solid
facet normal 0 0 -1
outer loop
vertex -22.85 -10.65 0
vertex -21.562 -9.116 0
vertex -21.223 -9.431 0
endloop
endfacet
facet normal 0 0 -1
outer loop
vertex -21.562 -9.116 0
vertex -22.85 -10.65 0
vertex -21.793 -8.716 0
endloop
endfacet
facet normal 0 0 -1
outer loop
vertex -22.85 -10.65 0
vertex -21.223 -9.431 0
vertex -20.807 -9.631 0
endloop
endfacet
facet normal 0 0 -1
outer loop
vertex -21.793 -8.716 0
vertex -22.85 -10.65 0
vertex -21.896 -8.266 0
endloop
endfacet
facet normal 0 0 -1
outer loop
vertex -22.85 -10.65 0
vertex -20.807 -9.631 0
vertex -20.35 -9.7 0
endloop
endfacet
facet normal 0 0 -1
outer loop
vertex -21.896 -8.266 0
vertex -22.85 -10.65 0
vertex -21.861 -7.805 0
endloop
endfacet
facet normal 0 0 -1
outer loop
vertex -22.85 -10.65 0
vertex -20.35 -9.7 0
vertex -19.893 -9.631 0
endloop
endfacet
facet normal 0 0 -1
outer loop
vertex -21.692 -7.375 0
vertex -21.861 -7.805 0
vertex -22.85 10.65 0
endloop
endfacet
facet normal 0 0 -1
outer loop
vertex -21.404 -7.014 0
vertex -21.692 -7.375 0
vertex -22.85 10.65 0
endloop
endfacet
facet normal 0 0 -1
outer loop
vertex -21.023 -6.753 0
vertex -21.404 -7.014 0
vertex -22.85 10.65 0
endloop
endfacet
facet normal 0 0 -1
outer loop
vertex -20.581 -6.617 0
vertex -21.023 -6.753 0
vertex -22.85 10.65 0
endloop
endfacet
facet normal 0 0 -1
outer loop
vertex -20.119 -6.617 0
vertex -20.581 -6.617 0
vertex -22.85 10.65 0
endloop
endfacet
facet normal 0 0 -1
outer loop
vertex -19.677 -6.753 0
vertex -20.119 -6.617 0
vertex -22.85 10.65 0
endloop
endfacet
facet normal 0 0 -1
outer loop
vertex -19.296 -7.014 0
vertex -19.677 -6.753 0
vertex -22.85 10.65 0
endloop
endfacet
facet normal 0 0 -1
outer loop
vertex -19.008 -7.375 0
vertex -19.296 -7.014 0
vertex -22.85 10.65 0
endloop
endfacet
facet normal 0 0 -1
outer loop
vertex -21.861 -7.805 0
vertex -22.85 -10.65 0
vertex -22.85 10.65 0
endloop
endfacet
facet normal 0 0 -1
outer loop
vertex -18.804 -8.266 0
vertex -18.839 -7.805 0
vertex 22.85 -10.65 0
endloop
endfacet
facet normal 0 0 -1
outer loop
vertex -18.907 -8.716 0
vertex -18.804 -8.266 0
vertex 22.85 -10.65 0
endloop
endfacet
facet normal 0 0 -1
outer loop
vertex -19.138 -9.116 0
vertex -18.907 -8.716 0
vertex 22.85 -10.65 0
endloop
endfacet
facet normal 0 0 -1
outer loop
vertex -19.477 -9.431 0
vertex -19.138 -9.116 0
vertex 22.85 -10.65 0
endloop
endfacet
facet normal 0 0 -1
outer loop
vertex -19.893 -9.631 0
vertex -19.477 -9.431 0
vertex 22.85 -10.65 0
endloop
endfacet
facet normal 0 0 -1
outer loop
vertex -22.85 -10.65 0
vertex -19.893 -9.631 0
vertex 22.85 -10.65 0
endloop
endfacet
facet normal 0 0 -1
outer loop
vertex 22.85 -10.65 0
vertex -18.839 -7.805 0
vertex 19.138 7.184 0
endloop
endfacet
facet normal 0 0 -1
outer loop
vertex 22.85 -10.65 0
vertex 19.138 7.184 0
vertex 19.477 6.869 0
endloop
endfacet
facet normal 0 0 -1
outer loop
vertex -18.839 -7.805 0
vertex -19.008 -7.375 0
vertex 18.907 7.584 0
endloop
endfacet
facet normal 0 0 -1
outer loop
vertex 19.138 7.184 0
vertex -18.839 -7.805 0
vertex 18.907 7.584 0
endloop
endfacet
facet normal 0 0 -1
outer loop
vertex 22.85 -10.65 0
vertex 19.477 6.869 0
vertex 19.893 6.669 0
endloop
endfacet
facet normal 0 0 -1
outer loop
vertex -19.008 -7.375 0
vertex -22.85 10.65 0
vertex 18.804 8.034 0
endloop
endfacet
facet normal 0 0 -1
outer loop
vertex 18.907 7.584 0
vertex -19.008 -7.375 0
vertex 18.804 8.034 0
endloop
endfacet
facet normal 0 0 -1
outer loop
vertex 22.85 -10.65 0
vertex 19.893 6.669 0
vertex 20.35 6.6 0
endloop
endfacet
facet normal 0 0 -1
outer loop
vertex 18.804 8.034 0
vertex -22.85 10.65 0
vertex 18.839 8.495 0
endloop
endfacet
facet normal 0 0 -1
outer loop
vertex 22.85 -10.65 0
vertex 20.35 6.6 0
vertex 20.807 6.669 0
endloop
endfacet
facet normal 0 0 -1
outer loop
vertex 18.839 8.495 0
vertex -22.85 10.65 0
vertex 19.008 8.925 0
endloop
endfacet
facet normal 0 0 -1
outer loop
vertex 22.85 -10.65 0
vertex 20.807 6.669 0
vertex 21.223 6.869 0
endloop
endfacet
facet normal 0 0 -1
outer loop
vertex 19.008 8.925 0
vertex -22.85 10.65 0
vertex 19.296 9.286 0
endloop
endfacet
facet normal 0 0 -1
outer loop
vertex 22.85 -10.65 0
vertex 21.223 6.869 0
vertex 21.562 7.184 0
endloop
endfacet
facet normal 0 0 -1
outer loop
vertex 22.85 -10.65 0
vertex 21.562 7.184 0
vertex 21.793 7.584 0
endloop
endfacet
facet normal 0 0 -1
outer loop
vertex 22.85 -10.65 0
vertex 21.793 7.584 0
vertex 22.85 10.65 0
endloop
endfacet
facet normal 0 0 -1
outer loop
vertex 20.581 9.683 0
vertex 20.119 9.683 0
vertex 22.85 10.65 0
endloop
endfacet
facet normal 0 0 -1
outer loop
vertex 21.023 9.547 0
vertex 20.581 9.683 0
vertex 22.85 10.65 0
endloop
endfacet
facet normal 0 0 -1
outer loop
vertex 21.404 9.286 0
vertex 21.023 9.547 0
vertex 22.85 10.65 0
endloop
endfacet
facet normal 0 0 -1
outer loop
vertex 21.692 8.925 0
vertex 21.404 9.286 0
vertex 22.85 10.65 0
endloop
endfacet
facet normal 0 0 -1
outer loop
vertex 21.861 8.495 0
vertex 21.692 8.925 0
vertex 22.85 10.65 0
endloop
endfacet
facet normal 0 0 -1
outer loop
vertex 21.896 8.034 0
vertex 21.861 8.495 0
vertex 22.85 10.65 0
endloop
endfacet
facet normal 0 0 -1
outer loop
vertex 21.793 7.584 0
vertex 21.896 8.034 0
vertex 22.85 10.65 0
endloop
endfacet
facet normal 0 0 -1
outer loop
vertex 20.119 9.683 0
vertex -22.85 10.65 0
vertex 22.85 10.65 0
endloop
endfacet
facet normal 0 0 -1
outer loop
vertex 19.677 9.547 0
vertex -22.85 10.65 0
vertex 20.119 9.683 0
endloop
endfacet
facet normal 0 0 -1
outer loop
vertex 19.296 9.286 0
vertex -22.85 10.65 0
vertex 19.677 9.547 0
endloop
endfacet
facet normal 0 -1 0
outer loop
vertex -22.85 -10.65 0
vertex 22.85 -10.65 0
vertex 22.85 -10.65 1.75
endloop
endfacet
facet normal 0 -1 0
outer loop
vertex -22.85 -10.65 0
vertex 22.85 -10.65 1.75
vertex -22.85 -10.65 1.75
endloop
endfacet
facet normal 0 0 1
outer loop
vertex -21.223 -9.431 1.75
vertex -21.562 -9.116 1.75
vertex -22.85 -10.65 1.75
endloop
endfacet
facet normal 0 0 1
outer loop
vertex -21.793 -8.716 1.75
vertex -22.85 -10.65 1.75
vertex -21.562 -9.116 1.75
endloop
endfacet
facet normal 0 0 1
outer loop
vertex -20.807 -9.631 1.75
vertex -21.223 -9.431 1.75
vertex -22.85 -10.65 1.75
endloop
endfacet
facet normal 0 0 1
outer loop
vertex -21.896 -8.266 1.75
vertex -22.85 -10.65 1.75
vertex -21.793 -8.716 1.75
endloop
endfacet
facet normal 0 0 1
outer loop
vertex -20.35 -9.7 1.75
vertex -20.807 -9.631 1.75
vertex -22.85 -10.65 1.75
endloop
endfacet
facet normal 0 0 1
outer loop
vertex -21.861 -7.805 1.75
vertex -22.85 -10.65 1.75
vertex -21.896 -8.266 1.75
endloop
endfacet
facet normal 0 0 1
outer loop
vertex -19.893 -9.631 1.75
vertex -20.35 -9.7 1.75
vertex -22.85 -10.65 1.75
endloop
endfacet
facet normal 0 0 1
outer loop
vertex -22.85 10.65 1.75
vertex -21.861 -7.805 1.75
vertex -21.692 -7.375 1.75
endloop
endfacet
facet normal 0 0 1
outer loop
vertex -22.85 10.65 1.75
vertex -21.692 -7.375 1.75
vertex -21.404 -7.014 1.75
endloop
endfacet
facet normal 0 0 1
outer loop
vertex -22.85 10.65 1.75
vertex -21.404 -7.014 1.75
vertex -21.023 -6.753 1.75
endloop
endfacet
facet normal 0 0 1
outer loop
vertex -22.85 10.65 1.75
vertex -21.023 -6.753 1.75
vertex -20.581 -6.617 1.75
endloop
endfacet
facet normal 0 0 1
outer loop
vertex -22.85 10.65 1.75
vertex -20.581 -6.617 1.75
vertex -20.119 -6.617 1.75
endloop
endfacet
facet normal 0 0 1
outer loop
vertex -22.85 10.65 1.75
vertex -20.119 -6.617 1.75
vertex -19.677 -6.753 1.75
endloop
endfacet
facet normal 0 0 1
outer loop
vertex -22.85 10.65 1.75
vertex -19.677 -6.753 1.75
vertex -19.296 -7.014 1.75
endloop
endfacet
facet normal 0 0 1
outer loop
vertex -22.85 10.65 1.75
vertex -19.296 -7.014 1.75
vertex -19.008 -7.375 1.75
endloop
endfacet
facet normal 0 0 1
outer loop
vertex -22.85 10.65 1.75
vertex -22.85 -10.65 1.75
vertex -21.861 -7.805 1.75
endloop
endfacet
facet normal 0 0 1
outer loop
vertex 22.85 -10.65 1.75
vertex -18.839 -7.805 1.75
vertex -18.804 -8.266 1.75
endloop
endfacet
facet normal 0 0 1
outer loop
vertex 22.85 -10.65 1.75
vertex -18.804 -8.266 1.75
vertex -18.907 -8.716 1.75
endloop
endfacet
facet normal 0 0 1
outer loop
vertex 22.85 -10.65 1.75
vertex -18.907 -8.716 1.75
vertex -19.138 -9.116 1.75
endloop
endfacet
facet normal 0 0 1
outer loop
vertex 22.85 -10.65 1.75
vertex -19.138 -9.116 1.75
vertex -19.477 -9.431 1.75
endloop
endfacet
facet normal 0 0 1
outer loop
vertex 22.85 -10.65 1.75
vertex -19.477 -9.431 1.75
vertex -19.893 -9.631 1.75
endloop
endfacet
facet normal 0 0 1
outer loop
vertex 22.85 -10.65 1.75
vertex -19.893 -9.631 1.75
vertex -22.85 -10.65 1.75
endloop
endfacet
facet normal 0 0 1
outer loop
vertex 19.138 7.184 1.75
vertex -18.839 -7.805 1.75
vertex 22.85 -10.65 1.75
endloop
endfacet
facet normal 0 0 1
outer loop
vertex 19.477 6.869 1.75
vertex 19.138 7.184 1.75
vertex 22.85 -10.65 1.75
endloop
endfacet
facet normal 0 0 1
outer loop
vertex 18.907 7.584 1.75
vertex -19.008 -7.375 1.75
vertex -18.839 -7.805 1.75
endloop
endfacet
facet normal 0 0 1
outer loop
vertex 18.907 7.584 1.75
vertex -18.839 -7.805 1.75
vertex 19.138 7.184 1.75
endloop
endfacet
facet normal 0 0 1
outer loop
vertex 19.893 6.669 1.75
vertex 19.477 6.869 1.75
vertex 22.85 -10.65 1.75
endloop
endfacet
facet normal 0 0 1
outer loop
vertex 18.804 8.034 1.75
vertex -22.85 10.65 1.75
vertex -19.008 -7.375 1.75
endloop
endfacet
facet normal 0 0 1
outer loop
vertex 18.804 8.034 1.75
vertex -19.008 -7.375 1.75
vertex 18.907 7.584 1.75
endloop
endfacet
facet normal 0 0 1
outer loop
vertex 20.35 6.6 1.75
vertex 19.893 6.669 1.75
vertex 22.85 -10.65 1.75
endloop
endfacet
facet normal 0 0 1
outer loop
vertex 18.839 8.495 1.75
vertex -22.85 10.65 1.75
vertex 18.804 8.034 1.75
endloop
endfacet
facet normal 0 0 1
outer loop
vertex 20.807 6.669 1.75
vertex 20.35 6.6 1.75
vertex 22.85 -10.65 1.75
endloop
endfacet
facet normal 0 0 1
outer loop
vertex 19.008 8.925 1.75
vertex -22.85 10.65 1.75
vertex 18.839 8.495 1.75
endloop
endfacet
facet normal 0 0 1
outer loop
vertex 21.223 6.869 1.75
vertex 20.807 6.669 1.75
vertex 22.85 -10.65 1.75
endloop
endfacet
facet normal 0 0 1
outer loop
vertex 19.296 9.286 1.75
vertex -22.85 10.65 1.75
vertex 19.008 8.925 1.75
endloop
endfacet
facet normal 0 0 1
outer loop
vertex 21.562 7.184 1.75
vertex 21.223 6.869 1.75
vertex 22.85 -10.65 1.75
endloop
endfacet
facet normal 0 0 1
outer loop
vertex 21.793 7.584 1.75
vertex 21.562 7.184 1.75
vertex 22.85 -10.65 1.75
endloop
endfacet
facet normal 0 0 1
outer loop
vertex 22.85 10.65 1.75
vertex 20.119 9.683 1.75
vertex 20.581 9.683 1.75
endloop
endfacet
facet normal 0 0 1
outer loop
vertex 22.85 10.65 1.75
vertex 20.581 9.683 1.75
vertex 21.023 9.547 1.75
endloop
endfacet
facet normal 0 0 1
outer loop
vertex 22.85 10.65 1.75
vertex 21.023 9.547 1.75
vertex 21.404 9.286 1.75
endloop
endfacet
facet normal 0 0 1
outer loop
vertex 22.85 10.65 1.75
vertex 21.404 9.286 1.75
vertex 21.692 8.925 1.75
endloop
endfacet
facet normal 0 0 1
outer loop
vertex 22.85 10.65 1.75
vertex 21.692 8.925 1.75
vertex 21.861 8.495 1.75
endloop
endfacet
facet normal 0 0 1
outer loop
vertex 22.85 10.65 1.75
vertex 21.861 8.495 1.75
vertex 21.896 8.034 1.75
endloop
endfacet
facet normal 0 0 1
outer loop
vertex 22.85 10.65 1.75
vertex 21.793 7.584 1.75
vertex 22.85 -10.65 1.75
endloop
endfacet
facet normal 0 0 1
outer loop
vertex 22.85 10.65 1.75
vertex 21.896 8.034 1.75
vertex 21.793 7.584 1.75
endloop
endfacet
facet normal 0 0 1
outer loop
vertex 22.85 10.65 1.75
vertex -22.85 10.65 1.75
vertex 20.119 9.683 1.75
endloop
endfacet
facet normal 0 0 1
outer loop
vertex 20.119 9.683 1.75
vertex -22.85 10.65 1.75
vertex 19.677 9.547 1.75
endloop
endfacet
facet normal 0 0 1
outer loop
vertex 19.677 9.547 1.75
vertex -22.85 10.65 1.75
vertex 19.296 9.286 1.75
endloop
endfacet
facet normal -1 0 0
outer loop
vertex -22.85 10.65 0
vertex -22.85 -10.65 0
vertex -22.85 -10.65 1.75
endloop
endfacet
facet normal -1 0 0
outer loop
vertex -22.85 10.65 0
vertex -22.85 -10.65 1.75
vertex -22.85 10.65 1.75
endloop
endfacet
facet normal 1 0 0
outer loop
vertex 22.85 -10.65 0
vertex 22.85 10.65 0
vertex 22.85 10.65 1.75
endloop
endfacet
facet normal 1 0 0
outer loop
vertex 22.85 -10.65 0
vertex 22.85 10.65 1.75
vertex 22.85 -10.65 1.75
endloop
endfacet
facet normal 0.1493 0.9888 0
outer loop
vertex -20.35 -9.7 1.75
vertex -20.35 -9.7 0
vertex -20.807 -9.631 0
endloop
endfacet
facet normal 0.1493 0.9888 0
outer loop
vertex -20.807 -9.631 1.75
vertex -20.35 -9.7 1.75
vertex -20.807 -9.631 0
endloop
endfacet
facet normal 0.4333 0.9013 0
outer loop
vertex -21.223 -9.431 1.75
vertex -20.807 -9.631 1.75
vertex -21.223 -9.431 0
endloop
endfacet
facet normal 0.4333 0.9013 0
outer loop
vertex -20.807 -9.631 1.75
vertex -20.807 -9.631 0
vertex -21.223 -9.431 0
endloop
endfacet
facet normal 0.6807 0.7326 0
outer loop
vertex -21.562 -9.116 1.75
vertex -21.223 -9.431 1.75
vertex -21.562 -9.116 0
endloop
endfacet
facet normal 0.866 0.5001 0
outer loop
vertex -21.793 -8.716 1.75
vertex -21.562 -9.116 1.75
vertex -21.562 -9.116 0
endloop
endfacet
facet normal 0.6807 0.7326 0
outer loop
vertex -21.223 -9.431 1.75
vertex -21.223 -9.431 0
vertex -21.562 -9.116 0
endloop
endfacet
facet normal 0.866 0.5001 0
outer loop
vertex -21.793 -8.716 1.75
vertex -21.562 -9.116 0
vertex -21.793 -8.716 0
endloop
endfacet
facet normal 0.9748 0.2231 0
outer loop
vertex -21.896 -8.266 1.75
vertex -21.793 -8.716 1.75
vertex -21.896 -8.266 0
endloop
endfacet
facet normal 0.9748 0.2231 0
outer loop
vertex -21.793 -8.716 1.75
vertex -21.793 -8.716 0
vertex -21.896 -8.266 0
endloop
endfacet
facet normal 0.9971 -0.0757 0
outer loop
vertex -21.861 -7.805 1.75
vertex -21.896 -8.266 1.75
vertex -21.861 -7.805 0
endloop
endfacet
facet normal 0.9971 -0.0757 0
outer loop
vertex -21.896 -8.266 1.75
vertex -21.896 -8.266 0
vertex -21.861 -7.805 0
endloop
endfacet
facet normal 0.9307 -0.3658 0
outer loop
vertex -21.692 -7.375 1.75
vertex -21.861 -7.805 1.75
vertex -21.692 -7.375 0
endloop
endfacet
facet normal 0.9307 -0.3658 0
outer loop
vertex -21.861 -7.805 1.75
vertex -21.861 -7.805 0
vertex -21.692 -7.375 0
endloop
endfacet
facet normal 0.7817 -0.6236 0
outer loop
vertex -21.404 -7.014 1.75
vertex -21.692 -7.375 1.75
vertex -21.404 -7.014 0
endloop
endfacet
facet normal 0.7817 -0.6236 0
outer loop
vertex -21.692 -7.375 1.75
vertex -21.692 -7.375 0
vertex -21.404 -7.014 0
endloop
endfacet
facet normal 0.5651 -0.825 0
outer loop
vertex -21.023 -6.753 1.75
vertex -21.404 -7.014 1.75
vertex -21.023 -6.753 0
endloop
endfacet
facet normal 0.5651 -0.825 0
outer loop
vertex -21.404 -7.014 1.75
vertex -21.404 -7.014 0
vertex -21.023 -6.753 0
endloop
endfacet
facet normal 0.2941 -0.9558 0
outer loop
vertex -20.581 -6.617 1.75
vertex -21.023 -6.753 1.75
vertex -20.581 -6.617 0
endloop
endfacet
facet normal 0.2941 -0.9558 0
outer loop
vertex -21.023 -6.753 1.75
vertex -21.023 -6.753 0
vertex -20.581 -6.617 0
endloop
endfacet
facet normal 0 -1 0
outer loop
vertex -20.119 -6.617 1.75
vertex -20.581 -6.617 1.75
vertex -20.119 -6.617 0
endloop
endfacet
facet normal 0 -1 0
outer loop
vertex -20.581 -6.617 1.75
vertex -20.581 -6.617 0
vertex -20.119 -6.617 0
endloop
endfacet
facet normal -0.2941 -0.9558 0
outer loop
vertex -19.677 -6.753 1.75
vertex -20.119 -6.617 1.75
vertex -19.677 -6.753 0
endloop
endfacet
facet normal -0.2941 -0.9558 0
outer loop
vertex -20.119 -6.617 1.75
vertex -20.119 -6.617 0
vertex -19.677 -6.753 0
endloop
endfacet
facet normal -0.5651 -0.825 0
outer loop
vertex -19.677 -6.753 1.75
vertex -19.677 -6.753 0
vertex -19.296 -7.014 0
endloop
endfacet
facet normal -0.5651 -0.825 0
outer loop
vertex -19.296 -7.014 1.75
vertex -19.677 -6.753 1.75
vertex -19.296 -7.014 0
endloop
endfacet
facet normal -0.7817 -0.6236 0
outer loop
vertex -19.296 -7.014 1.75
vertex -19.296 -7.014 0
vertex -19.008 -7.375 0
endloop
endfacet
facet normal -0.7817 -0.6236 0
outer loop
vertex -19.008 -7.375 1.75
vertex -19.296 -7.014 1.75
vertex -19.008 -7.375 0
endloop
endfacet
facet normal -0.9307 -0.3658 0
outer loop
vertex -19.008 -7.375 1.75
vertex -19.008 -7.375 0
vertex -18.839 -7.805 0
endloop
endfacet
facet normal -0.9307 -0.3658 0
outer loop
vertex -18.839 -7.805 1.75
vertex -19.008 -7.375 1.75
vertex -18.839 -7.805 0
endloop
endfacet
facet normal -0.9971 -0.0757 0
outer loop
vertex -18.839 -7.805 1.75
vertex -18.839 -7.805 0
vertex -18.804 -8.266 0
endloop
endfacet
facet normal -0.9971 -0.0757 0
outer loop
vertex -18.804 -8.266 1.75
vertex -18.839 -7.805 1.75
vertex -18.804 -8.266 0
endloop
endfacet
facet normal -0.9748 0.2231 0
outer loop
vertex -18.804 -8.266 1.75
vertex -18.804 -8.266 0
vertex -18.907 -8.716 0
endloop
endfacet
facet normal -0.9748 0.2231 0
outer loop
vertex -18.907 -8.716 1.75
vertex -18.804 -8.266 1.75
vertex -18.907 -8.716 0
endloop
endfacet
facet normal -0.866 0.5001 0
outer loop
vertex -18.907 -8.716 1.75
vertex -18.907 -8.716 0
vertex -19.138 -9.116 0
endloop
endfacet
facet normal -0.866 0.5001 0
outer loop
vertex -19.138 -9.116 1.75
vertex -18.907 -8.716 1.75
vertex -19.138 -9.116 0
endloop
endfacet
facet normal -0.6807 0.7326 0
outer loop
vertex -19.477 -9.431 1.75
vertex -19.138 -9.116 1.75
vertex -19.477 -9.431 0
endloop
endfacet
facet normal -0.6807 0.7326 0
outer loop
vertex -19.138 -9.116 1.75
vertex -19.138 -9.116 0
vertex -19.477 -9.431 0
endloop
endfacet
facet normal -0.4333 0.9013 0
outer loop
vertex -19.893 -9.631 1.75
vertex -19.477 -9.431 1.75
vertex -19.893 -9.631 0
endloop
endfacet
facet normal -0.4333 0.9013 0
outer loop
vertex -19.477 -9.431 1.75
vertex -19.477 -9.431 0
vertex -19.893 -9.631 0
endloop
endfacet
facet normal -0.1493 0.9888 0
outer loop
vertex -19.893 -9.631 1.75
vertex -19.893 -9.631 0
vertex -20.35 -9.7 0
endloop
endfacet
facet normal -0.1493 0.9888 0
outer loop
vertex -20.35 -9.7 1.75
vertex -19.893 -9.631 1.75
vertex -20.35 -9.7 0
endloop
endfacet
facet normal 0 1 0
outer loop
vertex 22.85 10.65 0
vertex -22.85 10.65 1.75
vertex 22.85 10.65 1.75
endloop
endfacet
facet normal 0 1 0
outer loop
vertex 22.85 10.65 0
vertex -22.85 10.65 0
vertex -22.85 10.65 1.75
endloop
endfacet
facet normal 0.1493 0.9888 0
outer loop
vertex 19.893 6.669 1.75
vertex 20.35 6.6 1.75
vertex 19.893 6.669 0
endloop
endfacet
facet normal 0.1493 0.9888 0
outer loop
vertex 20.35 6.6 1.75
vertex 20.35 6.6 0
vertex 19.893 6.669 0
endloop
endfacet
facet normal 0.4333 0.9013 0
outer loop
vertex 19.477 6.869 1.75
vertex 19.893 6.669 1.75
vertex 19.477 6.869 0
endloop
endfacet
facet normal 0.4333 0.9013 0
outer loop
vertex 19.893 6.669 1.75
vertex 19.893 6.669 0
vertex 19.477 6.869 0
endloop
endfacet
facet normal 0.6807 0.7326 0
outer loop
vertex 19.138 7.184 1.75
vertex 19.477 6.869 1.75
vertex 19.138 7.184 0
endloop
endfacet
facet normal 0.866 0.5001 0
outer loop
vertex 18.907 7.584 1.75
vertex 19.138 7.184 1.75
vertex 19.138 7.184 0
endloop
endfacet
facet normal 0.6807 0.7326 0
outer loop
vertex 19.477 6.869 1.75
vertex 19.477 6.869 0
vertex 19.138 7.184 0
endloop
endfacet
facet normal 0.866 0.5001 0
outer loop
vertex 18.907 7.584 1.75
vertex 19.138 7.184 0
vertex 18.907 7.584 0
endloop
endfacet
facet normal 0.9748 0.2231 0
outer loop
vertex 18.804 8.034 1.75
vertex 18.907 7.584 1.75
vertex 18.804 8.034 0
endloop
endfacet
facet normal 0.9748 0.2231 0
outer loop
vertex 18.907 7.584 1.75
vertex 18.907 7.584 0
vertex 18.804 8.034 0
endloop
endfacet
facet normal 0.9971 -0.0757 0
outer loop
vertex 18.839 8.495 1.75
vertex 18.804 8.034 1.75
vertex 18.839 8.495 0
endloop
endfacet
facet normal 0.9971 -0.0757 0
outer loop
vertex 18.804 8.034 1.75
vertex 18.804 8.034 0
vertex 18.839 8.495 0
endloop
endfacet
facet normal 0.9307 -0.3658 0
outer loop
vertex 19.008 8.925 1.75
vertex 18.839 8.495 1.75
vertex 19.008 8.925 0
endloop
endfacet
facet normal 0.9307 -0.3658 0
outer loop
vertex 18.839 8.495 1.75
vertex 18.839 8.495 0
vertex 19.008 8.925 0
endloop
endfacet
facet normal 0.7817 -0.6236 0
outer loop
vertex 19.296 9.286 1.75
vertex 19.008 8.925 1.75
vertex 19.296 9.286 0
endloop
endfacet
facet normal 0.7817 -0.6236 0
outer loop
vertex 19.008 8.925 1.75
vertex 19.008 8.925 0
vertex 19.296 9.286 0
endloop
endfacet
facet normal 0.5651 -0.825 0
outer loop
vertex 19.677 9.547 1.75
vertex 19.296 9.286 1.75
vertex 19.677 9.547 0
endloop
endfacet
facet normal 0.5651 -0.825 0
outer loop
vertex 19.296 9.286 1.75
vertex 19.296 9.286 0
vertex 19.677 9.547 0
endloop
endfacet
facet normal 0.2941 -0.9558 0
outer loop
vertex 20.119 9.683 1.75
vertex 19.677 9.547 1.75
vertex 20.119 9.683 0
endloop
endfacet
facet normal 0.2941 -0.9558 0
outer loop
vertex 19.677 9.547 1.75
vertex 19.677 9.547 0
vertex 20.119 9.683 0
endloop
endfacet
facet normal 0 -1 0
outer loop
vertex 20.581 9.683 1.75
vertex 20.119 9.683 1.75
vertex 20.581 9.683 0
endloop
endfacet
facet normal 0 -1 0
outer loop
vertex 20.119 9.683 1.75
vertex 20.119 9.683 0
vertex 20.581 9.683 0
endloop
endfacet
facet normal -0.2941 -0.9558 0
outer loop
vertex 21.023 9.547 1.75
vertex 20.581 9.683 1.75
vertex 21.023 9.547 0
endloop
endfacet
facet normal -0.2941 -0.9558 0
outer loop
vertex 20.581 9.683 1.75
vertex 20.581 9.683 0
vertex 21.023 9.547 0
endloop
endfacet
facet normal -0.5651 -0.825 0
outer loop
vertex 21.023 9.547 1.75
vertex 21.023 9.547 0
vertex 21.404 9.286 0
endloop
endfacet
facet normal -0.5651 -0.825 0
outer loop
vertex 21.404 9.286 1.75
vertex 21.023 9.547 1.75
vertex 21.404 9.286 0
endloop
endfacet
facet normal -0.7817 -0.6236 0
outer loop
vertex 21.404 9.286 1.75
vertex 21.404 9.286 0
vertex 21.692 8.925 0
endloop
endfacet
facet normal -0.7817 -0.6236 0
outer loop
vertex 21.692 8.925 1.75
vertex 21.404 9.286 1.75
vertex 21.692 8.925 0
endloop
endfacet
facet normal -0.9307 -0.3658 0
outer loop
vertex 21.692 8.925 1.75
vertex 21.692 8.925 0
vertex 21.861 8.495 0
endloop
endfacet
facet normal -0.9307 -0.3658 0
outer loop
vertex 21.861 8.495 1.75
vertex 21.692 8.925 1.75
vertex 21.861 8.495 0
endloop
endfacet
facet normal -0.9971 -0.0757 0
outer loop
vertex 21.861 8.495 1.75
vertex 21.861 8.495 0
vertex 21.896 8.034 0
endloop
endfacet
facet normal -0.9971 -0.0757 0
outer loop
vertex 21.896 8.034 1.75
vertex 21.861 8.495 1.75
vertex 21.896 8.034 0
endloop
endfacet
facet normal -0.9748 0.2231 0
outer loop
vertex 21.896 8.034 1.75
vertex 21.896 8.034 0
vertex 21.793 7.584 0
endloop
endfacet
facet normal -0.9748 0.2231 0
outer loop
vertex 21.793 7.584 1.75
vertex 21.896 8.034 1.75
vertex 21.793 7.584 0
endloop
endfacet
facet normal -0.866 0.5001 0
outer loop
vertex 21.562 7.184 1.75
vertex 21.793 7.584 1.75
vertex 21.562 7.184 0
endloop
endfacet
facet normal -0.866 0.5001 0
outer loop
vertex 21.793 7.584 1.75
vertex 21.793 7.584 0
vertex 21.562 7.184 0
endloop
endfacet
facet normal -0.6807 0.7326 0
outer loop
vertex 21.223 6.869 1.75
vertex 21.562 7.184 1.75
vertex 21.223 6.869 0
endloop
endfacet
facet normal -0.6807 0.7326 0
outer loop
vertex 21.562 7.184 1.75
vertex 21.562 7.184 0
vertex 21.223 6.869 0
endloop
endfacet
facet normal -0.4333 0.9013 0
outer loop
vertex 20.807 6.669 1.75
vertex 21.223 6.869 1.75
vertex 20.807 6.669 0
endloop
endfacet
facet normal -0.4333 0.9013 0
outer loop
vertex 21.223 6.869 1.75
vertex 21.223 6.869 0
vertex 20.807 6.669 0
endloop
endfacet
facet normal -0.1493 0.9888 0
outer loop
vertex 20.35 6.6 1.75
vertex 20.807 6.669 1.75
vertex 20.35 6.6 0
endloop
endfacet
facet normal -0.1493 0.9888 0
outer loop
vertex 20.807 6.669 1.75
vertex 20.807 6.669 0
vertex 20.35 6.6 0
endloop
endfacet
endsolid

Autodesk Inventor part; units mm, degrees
ref_plane "YZ Plane" through (0, 0, 0) normal (1, 0, 0) x (0, 1, 0)
ref_plane "XZ Plane" through (0, 0, 0) normal (0, 1, 0) x (-1, 0, 0)
ref_plane "XY Plane" through (0, 0, 0) normal (0, 0, 1) x (1, 0, 0)
sketch "Sketch1" plane through (0, 0, 0) normal (0, 0, 1) x (1, 0, 0)
  line L0 (-22.85, 10.65) -> (22.85, 10.65)
  line L1 (22.85, 10.65) -> (22.85, -10.65)
  line L2 (22.85, -10.65) -> (-22.85, -10.65)
  line L3 (-22.85, -10.65) -> (-22.85, 10.65)
  line L4 (0, 0) -> (0, 10.65) construction
  line L5 (0, 0) -> (0, -10.65) construction
  line L6 (0, 0) -> (22.85, 0) construction
  line L7 (0, 0) -> (-22.85, 0) construction
  dimension "d0" = 45.7
  dimension "d1" = 21.3
extrude "Extrusion1" add sketch "Sketch1" along normal blind 1.75
sketch "Sketch2" plane through (0, 0, 1.75) normal (0, 0, 1) x (1, 0, 0)
  line L0 (22.85, 10.65) -> (22.85, -10.65) projected
  line L1 (-22.85, 10.65) -> (22.85, 10.65) projected
  line L2 (22.85, -10.65) -> (-22.85, -10.65) projected
  point P0 (-20.35, -8.15)
  point P1 (20.35, 8.15)
  dimension "d4" = 2.5
  dimension "d5" = 2.5
  dimension "d6" = 2.5
  dimension "d7" = 2.5
hole "Hole1" at (-20.35, -8.15, 1.75) at (20.35, 8.15, 1.75) direction (0, 0, -1) diameter 3.1 end through all
properties part number "Parallax_Ping_PCB" material "Phenolic"
